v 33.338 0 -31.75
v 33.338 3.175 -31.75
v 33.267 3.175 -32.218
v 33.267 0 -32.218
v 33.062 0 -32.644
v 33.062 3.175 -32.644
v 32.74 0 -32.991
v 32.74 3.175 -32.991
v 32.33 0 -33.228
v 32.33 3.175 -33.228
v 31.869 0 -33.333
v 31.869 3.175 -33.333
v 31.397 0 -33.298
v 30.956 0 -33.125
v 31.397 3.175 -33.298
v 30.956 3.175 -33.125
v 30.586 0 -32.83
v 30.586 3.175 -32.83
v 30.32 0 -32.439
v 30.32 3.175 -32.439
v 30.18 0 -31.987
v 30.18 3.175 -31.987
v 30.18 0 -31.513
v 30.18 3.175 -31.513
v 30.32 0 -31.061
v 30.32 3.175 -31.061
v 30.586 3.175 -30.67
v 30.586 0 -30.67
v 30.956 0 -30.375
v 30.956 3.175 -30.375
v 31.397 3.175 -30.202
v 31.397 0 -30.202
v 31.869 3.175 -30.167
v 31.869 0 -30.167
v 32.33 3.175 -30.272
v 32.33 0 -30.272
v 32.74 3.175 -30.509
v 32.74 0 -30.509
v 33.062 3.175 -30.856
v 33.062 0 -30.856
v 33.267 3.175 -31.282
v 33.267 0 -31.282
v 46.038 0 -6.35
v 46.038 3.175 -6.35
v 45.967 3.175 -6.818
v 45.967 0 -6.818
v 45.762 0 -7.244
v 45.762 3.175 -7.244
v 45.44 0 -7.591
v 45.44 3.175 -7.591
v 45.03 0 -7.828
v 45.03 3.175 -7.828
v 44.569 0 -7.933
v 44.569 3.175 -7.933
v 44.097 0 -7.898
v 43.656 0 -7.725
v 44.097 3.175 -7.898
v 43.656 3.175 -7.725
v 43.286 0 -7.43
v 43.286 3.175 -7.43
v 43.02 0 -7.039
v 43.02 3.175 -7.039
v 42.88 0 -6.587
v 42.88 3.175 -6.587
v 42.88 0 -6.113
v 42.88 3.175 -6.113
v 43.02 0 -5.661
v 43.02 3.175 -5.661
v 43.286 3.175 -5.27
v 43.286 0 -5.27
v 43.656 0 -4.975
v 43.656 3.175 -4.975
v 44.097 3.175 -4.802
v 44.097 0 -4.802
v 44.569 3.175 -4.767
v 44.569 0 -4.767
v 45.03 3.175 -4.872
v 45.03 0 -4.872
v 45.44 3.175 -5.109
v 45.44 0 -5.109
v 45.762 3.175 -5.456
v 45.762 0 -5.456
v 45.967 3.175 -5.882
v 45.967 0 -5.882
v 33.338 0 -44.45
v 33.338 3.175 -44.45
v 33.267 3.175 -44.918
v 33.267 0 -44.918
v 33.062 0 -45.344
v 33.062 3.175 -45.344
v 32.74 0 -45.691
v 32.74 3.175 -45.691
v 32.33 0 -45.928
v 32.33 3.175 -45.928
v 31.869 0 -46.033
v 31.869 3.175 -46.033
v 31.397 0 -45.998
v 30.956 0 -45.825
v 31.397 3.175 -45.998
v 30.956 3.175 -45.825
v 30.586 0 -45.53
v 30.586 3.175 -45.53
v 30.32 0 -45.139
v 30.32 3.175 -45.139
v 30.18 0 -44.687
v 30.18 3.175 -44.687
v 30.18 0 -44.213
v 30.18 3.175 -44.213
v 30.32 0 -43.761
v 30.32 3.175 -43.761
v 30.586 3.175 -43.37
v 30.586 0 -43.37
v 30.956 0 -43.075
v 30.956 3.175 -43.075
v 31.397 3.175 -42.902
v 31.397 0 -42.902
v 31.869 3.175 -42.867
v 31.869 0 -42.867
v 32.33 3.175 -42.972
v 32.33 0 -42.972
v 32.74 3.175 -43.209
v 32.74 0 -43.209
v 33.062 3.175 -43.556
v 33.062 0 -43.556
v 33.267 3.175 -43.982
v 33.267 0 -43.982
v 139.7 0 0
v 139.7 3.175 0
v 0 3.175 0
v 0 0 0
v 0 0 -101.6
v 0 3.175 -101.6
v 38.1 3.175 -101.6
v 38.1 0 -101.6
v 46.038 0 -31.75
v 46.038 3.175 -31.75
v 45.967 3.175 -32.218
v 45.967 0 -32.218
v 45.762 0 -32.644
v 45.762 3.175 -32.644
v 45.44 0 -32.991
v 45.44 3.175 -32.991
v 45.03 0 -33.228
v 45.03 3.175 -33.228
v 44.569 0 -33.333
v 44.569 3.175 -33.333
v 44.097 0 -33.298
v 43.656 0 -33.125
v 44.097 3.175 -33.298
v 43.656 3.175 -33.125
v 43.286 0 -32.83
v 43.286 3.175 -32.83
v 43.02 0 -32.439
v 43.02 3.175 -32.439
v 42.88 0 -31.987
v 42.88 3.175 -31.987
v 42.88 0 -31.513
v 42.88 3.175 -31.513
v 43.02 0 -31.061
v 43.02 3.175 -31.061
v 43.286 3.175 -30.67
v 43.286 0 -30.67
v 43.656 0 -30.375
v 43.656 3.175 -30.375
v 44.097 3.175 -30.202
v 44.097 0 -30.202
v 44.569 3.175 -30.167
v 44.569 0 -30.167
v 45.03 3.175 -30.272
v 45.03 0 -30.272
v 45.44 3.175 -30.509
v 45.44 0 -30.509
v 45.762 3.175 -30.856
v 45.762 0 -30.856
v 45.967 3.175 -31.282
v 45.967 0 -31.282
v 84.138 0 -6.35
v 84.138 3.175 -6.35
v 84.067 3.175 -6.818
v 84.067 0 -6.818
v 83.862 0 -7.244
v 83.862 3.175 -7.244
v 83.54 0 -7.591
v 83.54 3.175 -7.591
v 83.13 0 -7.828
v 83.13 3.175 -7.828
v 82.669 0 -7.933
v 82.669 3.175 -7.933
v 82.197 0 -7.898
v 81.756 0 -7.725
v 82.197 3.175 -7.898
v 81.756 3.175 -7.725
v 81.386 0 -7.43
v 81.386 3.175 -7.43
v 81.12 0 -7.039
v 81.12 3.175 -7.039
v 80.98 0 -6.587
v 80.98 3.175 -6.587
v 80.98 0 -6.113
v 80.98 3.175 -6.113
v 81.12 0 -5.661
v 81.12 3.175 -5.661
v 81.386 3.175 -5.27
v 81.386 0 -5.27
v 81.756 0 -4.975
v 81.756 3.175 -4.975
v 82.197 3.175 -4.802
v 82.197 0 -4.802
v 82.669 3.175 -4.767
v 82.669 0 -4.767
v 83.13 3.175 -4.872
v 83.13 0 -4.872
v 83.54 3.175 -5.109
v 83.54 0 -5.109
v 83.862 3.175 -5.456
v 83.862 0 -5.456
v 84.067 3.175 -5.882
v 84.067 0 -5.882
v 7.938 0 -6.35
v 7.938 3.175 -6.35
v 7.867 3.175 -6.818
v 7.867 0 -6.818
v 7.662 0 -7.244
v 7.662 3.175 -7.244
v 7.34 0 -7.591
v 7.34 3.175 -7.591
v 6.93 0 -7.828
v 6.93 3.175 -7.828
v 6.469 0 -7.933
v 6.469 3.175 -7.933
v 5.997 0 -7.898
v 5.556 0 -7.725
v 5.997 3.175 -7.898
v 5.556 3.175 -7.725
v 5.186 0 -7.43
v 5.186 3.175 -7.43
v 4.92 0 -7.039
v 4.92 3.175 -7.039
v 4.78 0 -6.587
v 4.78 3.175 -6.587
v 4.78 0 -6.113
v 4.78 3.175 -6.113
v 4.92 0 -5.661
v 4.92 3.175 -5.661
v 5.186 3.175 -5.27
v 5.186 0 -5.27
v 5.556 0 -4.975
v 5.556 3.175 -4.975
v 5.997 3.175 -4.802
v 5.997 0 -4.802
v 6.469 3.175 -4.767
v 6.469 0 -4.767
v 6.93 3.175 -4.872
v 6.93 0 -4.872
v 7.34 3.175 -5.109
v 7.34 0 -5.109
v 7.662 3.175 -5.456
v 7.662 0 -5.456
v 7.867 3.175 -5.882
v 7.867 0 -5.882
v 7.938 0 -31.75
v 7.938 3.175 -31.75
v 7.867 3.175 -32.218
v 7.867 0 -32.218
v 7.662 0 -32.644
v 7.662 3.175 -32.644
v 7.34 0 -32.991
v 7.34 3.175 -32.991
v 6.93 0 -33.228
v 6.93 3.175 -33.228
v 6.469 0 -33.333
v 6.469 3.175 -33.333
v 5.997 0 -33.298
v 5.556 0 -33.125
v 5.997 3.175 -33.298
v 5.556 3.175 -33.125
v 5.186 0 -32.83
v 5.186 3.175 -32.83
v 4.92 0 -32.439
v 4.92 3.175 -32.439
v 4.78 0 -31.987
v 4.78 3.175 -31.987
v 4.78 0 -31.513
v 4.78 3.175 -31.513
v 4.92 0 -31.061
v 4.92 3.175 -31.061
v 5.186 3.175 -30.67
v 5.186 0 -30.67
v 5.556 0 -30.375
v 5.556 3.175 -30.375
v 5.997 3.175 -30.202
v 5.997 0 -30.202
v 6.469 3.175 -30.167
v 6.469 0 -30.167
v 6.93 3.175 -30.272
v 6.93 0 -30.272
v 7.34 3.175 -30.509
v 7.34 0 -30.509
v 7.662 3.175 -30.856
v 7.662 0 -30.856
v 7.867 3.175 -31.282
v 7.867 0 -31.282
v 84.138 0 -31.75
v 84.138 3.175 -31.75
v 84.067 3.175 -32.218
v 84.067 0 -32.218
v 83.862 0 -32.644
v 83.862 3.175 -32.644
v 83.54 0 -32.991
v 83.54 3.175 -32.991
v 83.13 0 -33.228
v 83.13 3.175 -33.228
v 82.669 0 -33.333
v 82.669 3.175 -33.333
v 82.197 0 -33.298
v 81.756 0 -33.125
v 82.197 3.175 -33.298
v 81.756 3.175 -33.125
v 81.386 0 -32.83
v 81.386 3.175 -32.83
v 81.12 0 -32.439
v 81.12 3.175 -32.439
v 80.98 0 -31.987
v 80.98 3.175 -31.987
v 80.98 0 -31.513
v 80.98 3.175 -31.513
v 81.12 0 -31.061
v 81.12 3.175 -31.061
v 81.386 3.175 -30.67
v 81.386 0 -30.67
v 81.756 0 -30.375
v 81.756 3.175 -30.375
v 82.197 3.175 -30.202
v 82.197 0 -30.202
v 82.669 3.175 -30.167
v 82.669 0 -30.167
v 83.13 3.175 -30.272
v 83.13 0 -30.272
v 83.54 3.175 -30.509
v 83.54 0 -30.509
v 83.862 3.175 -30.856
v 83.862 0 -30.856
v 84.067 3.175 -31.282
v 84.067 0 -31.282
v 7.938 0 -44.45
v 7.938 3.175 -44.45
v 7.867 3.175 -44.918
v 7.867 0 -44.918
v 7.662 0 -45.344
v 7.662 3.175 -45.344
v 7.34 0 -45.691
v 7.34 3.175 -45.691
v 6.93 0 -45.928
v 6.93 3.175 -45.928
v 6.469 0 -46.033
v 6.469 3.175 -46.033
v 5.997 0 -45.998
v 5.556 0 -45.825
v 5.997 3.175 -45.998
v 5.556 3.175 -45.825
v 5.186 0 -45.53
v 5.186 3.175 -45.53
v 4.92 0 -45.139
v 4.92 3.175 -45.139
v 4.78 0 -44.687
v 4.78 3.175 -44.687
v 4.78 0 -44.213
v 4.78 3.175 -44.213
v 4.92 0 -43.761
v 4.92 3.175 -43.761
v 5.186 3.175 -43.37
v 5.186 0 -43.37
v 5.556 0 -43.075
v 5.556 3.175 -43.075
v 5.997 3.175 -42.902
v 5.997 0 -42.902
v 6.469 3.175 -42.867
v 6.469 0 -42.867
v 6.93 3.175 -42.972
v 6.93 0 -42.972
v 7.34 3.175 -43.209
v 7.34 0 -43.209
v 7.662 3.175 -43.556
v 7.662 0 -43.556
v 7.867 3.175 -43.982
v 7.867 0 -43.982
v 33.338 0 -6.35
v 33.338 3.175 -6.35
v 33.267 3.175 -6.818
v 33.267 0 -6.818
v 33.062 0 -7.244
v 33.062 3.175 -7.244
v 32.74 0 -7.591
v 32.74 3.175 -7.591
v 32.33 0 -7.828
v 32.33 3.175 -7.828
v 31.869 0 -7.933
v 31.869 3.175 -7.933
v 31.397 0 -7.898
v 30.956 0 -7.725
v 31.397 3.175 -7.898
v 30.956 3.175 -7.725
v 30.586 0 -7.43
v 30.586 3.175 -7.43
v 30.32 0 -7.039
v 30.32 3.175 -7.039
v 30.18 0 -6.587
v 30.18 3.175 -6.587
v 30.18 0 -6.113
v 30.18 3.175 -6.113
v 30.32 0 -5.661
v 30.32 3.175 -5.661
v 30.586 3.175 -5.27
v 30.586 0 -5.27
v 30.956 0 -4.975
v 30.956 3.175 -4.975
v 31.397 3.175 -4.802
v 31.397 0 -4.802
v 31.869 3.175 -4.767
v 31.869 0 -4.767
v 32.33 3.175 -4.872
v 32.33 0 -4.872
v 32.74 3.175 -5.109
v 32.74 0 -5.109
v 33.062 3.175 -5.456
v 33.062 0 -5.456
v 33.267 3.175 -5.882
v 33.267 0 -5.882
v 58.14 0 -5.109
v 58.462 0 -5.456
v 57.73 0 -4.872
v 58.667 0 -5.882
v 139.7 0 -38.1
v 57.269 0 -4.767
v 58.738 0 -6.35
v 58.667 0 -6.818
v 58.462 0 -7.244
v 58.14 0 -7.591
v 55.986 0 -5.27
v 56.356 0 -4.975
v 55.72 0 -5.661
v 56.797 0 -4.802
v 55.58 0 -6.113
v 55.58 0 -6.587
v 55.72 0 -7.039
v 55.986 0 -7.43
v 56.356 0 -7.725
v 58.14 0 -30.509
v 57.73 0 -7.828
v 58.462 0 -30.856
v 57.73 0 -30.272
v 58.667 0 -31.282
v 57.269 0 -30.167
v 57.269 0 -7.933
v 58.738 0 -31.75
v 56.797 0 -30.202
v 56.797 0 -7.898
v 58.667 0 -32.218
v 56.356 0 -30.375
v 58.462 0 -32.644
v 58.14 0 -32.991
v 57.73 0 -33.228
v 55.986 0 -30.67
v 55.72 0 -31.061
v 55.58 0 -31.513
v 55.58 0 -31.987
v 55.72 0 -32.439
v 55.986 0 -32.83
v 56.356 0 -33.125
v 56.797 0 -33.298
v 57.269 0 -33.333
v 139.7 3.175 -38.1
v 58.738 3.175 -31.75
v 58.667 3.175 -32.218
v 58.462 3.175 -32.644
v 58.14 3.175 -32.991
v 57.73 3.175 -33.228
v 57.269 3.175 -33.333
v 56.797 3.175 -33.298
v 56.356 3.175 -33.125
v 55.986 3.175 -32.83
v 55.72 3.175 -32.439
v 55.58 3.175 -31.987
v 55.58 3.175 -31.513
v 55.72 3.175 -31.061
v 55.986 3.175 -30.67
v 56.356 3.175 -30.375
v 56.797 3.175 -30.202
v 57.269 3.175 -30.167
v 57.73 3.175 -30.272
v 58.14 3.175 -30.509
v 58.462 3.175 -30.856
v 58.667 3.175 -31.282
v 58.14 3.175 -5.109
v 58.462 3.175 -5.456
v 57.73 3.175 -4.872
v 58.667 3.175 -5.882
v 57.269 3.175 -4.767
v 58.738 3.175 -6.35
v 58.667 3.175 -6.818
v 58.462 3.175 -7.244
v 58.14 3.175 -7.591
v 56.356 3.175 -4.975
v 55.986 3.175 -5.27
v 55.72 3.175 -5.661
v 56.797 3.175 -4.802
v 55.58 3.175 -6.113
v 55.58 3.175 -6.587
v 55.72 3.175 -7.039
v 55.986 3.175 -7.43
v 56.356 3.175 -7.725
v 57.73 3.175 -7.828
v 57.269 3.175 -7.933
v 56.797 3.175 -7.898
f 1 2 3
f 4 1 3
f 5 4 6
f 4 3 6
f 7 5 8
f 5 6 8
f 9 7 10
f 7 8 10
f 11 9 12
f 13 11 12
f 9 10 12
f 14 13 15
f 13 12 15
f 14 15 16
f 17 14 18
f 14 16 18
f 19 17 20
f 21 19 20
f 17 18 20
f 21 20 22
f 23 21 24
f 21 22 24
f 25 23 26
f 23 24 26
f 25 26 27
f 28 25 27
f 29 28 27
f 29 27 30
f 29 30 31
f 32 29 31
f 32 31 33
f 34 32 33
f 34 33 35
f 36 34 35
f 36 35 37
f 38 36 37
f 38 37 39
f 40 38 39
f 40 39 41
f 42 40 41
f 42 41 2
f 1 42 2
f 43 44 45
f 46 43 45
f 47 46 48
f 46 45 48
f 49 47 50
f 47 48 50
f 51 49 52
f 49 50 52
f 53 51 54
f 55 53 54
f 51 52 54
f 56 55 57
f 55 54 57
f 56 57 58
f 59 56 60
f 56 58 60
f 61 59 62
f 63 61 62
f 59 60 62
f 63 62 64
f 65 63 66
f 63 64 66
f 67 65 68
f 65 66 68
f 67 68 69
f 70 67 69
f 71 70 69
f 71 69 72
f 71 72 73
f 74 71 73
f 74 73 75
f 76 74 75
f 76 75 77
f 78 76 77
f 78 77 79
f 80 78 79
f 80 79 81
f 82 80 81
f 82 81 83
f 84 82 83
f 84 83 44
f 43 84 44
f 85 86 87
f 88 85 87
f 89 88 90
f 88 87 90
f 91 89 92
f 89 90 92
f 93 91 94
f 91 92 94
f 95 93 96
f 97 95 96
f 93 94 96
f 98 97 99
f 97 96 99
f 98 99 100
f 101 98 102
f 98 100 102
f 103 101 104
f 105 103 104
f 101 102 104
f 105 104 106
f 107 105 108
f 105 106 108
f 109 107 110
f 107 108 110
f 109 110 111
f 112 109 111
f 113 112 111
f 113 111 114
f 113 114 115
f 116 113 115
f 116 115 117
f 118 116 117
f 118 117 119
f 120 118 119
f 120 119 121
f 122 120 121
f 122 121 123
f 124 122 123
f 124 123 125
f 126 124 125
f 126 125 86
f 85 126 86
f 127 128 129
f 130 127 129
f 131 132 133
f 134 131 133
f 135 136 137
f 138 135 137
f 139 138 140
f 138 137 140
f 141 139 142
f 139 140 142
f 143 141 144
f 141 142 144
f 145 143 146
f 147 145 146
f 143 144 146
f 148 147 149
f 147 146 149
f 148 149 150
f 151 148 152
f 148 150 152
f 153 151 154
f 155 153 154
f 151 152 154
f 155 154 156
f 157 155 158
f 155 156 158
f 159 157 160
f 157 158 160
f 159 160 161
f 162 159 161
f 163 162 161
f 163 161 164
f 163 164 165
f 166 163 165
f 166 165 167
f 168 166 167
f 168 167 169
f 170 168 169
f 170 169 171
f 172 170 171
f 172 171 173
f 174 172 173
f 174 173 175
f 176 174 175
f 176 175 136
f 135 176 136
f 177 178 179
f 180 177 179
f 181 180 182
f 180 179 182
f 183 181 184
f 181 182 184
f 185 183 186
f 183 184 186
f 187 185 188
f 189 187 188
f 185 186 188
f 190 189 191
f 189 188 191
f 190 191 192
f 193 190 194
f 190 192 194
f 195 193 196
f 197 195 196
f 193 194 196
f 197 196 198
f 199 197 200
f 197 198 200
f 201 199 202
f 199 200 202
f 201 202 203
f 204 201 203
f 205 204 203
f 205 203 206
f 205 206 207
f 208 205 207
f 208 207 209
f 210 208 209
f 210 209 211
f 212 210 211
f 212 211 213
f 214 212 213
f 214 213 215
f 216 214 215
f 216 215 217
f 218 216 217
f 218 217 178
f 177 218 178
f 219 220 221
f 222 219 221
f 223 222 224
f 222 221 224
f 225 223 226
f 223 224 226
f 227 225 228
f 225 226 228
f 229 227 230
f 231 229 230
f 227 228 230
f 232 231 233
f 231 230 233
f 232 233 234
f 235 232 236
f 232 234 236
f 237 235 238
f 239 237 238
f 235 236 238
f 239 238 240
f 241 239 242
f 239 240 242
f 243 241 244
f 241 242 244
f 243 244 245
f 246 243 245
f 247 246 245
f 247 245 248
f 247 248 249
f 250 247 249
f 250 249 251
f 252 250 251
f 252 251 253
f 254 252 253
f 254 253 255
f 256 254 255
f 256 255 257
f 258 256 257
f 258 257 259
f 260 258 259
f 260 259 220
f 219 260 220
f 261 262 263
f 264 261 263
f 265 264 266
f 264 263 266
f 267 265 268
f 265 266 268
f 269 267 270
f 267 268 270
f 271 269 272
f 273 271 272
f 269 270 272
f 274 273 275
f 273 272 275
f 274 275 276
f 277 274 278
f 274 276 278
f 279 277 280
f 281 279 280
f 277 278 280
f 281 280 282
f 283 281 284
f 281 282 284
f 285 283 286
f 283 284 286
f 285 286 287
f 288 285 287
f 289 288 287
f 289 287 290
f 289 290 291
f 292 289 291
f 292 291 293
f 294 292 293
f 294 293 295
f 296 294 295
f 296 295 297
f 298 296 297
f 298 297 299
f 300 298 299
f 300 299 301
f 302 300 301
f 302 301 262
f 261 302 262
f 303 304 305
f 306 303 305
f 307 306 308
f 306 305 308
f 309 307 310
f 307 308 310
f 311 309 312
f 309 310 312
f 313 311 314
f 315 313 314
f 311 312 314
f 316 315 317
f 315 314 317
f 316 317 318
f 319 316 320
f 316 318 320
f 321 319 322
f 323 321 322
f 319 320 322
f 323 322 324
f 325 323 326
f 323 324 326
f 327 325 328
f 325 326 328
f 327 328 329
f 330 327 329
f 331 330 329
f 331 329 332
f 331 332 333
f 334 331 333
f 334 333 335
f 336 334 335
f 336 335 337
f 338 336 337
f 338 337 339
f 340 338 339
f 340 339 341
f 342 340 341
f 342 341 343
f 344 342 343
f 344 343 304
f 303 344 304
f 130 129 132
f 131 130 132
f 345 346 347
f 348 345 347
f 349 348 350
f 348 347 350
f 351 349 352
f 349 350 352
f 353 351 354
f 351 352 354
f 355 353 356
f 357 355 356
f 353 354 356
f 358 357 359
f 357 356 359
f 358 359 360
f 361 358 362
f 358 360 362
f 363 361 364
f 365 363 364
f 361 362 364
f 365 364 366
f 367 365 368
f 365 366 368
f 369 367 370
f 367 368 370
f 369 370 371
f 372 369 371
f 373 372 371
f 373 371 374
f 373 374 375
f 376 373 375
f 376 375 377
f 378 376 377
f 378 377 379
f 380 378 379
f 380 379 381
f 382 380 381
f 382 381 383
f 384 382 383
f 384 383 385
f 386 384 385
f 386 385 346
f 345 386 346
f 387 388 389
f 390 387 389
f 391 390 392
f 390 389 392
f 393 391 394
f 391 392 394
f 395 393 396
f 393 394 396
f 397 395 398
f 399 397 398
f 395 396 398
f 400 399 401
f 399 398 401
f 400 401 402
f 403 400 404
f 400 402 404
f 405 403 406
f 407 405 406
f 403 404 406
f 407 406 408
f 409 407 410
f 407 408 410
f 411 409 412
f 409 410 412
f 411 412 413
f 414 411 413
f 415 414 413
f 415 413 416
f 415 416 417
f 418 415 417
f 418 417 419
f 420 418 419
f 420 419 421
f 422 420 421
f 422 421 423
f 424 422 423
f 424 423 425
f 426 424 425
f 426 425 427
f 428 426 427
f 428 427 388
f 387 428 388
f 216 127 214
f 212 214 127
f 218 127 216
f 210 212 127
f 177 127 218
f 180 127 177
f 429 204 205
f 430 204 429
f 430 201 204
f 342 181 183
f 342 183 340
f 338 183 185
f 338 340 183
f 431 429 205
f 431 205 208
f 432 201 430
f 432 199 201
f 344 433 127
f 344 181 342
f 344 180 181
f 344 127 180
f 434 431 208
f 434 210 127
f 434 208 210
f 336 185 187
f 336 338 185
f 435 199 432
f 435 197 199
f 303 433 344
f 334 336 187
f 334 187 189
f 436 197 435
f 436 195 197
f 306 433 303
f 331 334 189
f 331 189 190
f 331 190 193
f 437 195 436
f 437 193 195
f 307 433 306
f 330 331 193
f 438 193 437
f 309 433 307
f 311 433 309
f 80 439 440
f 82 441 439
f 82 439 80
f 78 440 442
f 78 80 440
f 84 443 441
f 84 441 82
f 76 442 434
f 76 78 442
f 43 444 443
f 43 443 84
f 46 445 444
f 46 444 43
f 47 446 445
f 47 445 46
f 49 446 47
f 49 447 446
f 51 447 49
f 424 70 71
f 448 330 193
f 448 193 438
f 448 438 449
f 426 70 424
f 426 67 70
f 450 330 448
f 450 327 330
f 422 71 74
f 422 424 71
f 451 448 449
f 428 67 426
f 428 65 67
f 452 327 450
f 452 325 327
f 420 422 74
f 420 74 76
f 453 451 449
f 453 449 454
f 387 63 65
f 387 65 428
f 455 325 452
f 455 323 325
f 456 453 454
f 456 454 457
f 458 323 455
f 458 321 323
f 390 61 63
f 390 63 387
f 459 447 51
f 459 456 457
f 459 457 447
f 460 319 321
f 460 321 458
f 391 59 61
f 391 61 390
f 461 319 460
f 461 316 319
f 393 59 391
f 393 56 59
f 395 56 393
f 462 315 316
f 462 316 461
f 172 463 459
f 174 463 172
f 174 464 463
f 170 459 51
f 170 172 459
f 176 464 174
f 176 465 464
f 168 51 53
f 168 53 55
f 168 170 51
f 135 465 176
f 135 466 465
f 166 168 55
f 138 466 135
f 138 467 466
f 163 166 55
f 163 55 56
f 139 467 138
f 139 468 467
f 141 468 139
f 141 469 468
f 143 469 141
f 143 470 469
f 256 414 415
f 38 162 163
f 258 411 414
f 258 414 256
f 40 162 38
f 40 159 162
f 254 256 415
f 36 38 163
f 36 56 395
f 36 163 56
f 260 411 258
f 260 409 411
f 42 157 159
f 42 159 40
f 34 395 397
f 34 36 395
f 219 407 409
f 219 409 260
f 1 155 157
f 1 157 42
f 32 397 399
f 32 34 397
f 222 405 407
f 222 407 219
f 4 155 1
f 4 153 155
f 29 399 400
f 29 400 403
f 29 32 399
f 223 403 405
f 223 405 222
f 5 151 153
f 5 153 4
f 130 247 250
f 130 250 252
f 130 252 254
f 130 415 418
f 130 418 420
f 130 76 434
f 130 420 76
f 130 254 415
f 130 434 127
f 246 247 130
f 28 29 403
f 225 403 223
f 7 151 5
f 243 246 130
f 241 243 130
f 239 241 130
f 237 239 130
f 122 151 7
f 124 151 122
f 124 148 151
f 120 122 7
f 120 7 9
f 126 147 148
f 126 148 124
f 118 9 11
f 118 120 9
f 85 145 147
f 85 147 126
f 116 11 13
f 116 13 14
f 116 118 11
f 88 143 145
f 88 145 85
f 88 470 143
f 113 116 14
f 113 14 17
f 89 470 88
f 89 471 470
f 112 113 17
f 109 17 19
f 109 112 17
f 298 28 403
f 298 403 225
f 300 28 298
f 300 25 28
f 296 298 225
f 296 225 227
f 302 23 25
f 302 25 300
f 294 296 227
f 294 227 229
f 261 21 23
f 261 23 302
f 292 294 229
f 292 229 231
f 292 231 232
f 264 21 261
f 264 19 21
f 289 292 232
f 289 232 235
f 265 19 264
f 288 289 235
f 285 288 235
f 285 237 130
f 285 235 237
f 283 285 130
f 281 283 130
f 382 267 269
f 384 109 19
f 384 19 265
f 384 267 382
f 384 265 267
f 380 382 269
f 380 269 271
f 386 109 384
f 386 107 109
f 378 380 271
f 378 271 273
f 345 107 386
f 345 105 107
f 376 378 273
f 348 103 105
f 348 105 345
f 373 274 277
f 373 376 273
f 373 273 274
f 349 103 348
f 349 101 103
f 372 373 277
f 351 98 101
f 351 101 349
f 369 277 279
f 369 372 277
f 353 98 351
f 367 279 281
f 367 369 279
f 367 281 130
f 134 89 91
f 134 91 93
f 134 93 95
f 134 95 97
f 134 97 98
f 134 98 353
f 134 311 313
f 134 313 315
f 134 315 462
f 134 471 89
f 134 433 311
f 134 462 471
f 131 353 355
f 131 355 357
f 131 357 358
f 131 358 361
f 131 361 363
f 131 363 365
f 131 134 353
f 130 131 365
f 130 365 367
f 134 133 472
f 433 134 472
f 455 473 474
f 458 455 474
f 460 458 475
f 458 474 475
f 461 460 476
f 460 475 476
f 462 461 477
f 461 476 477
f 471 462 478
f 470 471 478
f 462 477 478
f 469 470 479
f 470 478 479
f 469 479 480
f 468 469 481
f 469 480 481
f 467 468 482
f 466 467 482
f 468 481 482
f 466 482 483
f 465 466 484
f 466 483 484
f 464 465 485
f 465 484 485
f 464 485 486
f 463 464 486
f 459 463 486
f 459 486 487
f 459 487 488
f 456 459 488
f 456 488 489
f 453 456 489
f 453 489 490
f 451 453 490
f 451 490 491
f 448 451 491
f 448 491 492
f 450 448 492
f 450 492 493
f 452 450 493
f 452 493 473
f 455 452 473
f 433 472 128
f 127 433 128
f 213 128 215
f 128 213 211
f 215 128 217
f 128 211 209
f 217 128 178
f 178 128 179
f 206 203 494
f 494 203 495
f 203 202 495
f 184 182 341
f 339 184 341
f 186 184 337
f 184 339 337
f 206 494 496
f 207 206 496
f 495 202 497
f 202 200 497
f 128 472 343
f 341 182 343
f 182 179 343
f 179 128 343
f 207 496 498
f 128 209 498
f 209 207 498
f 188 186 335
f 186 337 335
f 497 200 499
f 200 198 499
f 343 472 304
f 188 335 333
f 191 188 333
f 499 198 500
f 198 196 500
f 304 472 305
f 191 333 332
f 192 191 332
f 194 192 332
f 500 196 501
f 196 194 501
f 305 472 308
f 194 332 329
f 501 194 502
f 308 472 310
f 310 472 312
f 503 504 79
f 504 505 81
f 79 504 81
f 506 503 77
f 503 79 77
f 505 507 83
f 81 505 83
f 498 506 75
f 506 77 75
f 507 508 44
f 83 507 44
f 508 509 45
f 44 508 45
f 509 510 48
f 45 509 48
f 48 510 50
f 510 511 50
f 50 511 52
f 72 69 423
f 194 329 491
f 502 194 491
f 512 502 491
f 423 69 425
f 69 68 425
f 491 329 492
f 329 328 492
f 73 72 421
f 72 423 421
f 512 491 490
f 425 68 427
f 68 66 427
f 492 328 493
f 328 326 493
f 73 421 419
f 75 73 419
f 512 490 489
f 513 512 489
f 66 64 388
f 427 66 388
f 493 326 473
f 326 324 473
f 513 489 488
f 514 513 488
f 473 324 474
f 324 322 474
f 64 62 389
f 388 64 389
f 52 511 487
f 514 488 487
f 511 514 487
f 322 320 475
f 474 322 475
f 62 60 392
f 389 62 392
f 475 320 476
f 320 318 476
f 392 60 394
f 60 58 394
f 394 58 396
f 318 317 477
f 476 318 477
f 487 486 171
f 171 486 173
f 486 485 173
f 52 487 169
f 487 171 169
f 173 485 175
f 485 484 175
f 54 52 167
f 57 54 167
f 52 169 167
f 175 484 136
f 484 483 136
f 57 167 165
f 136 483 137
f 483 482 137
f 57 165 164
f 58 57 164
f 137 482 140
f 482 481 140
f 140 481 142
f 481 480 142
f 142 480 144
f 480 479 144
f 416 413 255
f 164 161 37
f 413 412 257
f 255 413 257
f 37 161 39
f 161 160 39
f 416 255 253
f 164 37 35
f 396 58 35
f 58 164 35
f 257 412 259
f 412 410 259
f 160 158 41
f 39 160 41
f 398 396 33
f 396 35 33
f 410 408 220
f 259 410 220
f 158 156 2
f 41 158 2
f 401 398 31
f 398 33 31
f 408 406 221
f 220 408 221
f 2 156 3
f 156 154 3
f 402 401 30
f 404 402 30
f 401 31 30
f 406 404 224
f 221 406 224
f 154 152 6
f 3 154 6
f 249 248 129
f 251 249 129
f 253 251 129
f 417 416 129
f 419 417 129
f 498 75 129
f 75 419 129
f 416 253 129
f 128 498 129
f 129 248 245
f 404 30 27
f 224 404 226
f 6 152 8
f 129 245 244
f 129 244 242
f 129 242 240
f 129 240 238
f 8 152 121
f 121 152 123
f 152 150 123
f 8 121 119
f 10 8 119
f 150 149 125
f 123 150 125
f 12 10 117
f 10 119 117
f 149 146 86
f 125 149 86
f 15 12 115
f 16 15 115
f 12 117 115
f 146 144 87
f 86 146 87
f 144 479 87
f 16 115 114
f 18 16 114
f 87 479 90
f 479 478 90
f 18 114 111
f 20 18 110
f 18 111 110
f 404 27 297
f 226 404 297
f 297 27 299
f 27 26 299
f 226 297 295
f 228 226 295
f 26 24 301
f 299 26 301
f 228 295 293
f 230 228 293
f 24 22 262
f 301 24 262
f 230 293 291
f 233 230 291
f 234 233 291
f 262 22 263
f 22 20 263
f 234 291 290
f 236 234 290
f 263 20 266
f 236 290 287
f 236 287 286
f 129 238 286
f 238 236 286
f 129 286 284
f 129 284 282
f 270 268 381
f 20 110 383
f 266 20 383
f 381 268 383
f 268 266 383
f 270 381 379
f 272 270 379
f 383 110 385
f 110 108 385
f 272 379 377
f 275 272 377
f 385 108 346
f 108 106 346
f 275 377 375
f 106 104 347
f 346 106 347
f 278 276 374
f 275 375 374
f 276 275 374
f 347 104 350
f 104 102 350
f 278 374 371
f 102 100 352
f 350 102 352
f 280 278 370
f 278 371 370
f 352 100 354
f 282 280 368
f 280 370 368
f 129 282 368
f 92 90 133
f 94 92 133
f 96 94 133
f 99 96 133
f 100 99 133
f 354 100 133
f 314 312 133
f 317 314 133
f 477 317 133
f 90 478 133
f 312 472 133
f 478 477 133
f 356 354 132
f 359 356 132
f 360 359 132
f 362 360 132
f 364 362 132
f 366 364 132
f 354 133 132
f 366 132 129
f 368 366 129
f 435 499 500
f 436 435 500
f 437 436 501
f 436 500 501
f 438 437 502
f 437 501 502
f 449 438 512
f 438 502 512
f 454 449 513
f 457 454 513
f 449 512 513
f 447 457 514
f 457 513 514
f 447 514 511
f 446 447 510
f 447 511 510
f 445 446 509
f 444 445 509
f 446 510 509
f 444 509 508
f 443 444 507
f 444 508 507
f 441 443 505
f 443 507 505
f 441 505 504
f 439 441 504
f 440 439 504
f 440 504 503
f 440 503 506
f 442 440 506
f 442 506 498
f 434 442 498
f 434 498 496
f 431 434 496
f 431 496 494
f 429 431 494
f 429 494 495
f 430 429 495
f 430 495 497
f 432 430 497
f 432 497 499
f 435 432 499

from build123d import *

# Parameters (mm, degrees)
BOSS_EXTRUDE1_DEPTH = 3.175
SKETCH2_R           = 1.5875
CUT_EXTRUDE1_DEPTH  = 4.175
BOSS_EXTRUDE2_DEPTH = 3.175


with BuildPart() as part:
    # Sketch1 → Boss-Extrude1 (new body)
    with BuildSketch(Plane(origin=(0, 0, 0), x_dir=(1, 0, 0), z_dir=(0, 1, 0))):
        Polygon((0, 50.8), (0, 0), (88.9, 0), (88.9, 38.1), (38.1, 38.1), (38.1, 50.8), align=None)
    extrude(amount=BOSS_EXTRUDE1_DEPTH)

    # Sketch2 → Cut-Extrude1 (cut, through all)
    with BuildSketch(Plane(origin=(0, 3.175, 0), x_dir=(1, 0, 0), z_dir=(0, 1, 0))):
        with Locations((6.35, 44.45)):
            Circle(SKETCH2_R)
        with Locations((31.75, 44.45)):
            Circle(SKETCH2_R)
        with Locations((31.75, 31.75)):
            Circle(SKETCH2_R)
        with Locations((6.35, 31.75)):
            Circle(SKETCH2_R)
        with Locations((6.35, 6.35)):
            Circle(SKETCH2_R)
        with Locations((31.75, 6.35)):
            Circle(SKETCH2_R)
        with Locations((82.55, 6.35)):
            Circle(SKETCH2_R)
        with Locations((82.55, 31.75)):
            Circle(SKETCH2_R)
        with Locations((57.15, 31.75)):
            Circle(SKETCH2_R)
        with Locations((57.15, 6.35)):
            Circle(SKETCH2_R)
        with Locations((44.45, 6.35)):
            Circle(SKETCH2_R)
        with Locations((44.45, 31.75)):
            Circle(SKETCH2_R)
    extrude(amount=-CUT_EXTRUDE1_DEPTH, mode=Mode.SUBTRACT)

    # Sketch3 → Boss-Extrude2 (add)
    with BuildSketch(Plane(origin=(0, 3.175, 0), x_dir=(1, 0, 0), z_dir=(0, 1, 0))):
        Polygon((0, 101.6), (38.1, 101.6), (139.7, 38.1), (139.7, 0), (88.9, 0), (88.9, 38.1), (38.1, 38.1), (38.1, 50.8), (0, 50.8), align=None)
    extrude(amount=-BOSS_EXTRUDE2_DEPTH)


solid = part.part
